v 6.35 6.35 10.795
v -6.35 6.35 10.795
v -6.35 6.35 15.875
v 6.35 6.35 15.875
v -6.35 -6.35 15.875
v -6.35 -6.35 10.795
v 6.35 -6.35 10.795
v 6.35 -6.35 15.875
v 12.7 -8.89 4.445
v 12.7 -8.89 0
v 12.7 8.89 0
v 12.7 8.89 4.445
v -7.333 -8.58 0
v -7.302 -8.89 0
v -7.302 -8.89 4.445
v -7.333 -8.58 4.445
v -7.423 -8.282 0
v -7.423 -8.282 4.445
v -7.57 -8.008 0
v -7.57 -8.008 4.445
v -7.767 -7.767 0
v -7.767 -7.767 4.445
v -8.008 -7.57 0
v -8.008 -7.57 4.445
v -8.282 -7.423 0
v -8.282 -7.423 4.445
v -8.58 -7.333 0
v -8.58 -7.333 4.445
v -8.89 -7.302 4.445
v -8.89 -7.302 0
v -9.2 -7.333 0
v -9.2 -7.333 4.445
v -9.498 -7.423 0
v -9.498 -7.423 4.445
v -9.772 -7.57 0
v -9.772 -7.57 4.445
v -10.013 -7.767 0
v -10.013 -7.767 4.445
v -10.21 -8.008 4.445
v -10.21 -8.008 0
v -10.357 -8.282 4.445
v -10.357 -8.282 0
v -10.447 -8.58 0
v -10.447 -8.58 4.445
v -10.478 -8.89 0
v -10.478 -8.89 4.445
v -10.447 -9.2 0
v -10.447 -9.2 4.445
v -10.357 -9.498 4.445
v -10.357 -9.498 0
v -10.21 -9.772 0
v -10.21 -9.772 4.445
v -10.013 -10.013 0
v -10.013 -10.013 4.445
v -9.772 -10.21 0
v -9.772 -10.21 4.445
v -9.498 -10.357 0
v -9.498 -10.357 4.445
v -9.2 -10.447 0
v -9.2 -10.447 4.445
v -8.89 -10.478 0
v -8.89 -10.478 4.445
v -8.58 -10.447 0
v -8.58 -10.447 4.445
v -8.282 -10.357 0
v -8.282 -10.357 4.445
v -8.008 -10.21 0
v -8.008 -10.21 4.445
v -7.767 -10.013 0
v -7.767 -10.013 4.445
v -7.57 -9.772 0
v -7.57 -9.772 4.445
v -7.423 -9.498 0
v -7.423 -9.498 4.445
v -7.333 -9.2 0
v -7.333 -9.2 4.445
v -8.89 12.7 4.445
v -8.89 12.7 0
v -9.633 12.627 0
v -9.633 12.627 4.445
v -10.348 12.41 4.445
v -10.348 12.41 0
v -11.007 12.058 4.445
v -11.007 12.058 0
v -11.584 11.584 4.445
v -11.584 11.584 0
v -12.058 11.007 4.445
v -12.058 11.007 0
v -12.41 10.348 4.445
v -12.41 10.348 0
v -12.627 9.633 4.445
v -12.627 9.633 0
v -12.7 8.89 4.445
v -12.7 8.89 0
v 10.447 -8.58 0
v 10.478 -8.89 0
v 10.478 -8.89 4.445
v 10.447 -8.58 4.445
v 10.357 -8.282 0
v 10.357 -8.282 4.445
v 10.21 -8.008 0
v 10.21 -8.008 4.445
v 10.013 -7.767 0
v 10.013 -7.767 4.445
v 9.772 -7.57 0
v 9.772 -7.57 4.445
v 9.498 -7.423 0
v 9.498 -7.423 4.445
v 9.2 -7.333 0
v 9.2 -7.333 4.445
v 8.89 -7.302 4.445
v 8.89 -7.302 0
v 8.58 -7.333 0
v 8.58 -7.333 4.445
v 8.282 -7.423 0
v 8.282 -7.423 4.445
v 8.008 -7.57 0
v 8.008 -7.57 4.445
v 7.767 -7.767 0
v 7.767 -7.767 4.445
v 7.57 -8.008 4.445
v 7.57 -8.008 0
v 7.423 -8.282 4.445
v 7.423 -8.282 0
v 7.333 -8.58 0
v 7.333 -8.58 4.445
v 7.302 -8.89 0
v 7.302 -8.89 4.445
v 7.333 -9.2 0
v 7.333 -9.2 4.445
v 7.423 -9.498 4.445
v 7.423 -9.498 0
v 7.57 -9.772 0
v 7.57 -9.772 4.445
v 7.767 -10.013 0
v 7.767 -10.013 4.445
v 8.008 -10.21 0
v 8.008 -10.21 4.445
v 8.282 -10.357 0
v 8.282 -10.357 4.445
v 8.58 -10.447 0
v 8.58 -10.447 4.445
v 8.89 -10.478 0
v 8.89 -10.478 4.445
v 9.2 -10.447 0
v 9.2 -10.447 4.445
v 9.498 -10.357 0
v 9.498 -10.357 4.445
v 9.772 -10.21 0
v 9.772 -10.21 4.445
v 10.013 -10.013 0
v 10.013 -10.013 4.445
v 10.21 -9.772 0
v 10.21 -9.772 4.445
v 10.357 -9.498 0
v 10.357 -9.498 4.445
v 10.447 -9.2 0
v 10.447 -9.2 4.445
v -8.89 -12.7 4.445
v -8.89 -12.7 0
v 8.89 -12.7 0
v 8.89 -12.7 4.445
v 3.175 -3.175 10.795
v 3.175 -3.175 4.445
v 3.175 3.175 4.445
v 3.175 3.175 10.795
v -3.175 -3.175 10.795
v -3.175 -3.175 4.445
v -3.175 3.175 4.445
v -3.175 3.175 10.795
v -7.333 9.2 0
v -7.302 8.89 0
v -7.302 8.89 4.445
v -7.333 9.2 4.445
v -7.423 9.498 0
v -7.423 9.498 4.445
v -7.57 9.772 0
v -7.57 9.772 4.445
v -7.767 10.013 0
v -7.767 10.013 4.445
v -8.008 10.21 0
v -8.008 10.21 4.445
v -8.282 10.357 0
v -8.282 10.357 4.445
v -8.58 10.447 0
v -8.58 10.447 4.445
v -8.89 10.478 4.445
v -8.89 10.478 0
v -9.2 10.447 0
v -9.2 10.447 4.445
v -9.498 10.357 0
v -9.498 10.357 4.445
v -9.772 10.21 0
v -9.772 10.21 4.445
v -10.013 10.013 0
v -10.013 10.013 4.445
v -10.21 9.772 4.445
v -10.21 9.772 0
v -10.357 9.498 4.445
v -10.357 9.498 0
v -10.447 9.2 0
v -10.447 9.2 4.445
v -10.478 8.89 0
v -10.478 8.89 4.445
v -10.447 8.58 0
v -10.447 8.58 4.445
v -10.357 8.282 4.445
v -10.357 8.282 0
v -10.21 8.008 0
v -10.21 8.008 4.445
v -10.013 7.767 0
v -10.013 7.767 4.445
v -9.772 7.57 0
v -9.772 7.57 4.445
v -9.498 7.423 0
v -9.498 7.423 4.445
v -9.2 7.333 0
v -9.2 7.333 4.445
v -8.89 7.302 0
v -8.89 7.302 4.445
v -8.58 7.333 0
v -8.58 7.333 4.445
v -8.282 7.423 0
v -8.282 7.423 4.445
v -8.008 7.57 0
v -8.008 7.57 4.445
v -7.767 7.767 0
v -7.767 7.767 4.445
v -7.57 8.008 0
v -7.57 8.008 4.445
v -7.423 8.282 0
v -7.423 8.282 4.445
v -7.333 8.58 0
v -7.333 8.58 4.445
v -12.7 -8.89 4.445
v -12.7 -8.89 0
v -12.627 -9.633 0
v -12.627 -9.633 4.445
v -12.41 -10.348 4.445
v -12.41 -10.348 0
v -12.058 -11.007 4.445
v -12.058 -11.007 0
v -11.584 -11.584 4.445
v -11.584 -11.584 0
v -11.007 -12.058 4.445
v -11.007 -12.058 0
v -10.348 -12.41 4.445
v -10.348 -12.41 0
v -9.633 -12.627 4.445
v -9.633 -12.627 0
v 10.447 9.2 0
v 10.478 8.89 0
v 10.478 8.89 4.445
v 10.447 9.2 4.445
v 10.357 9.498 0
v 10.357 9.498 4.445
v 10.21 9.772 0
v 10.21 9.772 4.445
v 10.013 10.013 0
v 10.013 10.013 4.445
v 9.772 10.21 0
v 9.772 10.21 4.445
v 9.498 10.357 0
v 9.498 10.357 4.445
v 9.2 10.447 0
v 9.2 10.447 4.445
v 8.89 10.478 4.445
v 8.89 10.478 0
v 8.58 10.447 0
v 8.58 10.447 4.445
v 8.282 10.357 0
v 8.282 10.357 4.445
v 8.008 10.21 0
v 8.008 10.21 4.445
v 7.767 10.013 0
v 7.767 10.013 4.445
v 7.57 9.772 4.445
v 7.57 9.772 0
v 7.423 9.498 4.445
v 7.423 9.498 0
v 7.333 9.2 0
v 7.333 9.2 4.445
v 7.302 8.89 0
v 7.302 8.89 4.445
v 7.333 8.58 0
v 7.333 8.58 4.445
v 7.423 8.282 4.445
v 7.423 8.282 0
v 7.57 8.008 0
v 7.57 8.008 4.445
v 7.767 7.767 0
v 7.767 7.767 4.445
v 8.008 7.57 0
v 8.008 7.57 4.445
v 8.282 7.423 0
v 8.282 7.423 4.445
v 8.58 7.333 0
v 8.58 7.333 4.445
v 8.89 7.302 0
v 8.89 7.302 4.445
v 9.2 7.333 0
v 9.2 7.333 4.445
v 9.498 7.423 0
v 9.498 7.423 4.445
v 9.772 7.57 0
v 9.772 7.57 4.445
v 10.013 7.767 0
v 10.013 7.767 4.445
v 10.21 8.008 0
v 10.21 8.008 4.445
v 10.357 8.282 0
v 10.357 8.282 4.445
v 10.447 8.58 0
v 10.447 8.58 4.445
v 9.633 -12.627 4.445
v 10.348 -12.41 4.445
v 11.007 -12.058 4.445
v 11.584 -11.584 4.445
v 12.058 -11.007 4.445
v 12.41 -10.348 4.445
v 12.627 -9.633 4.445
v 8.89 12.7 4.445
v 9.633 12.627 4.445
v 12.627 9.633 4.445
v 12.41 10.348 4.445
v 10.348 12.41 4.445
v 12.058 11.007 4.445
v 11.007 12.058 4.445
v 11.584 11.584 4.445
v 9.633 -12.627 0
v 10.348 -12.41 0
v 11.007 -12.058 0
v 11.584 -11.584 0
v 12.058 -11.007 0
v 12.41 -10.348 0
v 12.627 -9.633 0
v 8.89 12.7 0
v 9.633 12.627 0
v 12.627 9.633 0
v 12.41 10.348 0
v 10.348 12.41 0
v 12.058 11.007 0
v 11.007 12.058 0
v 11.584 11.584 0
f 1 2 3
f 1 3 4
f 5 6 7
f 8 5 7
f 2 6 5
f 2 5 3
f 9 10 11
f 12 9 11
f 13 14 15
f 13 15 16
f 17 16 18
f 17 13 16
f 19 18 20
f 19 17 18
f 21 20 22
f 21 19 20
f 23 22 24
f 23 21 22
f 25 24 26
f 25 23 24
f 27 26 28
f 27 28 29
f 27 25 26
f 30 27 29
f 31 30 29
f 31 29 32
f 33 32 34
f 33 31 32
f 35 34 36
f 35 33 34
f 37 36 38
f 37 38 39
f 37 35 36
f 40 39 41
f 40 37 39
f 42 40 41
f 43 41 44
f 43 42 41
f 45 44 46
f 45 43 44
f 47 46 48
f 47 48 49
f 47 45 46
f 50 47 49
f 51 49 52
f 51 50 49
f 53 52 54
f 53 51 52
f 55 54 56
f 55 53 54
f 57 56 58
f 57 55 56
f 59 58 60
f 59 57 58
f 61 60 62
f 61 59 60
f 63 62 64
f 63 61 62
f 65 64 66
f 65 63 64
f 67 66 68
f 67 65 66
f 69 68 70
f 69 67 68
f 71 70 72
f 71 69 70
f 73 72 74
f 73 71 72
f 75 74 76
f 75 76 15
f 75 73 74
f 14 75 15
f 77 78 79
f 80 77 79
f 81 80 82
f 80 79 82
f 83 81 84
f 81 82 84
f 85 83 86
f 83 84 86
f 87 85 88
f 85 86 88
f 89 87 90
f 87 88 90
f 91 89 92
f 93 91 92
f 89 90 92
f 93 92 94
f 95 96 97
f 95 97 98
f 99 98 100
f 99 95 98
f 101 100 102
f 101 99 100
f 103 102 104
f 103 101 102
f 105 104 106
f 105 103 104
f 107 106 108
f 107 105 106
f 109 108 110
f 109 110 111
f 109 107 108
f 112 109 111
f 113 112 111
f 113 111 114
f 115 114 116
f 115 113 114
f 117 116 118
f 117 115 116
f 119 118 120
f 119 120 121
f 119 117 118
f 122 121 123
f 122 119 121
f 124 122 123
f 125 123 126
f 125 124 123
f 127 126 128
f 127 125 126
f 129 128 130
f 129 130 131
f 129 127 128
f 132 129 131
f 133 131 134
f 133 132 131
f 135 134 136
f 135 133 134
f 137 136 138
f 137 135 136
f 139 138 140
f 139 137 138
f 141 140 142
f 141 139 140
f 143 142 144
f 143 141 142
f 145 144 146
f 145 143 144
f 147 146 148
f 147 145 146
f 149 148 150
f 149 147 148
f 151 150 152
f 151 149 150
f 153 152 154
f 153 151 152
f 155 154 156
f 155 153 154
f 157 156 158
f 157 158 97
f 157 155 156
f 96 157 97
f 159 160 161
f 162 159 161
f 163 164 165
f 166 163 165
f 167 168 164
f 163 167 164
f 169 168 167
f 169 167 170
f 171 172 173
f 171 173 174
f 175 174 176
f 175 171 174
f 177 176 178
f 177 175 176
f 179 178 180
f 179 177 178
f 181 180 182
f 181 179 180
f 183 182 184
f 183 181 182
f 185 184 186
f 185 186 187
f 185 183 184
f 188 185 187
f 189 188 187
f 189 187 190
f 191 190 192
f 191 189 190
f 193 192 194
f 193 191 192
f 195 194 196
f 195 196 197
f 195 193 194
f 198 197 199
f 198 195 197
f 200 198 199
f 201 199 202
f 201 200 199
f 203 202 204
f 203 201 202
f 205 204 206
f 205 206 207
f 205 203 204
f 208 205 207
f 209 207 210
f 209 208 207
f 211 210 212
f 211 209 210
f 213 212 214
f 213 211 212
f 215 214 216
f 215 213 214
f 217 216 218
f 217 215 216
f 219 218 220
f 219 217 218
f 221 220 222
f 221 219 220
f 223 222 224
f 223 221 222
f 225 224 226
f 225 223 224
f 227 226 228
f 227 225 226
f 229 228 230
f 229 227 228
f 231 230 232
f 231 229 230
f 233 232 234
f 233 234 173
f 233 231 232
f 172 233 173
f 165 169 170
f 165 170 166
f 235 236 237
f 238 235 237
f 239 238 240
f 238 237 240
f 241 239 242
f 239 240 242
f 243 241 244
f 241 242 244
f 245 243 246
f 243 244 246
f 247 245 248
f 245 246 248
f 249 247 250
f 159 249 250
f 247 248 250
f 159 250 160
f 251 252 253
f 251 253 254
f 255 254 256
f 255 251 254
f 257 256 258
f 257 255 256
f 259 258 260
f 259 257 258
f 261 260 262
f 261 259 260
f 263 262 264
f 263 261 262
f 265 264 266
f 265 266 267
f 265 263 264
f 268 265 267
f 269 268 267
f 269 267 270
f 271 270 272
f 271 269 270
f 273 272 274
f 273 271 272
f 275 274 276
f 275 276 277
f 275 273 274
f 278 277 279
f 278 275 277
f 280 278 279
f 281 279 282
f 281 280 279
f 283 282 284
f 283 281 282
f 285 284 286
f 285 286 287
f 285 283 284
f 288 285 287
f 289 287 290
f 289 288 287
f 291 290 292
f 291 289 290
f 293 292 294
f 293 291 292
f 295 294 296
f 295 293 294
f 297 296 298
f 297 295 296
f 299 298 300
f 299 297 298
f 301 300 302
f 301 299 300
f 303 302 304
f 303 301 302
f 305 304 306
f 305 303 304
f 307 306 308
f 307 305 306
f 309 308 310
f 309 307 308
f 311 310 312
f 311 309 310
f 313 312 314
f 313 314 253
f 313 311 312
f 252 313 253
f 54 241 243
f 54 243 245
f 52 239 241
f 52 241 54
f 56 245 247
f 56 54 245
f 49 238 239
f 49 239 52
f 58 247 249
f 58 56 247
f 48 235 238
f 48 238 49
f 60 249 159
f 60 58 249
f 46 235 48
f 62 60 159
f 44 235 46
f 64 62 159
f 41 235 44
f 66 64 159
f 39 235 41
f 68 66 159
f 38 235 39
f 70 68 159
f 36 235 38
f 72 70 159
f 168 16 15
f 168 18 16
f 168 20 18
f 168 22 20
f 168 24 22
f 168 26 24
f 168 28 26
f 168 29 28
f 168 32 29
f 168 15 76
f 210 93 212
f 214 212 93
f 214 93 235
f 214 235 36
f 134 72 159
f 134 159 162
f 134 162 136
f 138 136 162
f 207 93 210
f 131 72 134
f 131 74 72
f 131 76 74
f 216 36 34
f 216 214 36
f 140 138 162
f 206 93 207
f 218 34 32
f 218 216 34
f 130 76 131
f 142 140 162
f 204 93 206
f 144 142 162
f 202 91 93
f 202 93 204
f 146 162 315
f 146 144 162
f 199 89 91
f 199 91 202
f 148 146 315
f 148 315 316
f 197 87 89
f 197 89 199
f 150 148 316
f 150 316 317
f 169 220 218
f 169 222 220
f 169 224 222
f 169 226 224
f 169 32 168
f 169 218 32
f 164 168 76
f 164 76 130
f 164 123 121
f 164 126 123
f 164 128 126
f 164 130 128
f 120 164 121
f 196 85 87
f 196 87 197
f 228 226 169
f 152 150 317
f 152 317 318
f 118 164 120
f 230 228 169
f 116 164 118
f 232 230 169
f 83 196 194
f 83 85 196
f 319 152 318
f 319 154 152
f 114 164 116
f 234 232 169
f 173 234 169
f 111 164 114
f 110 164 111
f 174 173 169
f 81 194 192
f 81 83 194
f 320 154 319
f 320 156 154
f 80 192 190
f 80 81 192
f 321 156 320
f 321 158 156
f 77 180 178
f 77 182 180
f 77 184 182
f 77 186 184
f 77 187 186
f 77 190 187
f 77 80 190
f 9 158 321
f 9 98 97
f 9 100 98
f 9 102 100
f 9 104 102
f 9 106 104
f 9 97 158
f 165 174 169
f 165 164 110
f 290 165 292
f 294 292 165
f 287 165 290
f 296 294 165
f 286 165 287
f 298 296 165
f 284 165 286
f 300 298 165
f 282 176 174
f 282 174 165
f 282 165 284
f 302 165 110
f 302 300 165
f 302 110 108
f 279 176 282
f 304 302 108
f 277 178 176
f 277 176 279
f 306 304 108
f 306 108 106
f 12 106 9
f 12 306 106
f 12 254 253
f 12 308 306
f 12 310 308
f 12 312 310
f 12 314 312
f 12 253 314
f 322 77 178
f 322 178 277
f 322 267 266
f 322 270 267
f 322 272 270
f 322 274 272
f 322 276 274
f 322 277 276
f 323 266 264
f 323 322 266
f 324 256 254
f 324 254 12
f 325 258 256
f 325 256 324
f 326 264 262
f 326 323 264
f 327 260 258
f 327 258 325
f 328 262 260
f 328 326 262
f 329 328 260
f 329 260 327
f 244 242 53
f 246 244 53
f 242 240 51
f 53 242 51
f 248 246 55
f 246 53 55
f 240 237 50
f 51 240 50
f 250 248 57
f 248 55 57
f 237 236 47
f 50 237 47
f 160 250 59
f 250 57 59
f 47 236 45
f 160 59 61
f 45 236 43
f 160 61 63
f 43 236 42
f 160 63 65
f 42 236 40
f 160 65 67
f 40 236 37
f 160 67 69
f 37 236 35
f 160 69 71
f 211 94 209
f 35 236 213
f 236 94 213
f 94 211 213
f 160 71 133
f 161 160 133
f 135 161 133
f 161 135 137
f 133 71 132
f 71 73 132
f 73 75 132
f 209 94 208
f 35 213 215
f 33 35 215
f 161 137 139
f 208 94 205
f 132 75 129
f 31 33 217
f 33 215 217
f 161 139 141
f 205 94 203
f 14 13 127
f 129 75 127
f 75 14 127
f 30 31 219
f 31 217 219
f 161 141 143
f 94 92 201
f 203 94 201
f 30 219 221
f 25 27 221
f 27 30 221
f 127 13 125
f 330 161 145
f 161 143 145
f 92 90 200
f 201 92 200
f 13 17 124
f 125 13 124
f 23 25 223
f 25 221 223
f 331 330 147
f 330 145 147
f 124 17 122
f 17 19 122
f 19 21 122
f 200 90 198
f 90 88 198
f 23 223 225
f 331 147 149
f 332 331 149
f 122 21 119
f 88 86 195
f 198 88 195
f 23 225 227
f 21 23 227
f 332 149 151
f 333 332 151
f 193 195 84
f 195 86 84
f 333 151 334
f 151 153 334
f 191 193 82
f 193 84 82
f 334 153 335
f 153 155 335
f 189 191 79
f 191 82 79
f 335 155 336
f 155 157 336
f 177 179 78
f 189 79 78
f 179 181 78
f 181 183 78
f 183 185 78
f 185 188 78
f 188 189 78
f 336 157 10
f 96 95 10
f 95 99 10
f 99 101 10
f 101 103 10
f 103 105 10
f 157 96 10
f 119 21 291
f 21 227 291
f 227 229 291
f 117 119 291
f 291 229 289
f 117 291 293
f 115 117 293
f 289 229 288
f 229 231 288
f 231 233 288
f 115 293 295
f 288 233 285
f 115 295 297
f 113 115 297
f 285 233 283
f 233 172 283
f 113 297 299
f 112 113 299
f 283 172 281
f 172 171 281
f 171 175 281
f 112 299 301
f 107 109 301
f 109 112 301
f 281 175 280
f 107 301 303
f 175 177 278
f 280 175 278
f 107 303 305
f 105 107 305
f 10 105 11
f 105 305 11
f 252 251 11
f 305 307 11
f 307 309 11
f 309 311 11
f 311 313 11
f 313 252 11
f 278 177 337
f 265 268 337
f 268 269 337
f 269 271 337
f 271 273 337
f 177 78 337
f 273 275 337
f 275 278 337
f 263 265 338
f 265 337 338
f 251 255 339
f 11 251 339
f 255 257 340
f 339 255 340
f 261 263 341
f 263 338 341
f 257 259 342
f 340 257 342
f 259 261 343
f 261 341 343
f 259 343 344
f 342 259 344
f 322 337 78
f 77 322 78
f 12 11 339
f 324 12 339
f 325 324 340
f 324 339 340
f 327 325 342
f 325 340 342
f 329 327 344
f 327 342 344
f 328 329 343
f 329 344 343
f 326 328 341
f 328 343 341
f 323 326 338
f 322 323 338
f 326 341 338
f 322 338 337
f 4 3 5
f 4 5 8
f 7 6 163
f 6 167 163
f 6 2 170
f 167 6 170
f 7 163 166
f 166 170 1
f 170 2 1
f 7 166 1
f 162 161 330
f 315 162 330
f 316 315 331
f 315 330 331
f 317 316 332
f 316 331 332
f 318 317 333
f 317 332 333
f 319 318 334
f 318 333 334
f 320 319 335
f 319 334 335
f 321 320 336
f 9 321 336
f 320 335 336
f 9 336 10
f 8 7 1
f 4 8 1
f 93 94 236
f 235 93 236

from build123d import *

# Parameters (mm, degrees)
F0_R     = 1.5875
F1_DEPTH = 4.445
F2_W     = 6.35
F2_H     = 6.35
F3_DEPTH = 6.35
F4_W     = 12.7
F4_H     = 12.7
F5_DEPTH = 5.08


with BuildPart() as f1:
    # F0 (on Top) → F1 (new body)
    with BuildSketch(Plane.XY):
        with BuildLine():
            ThreePointArc((12.7, 8.89), (11.584077, 11.584077), (8.89, 12.7))
            Line((8.89, 12.7), (-8.89, 12.7))
            ThreePointArc((-8.89, 12.7), (-11.584077, 11.584077), (-12.7, 8.89))
            Line((-12.7, 8.89), (-12.7, -8.89))
            ThreePointArc((-12.7, -8.89), (-11.584077, -11.584077), (-8.89, -12.7))
            Line((-8.89, -12.7), (8.89, -12.7))
            ThreePointArc((8.89, -12.7), (11.584077, -11.584077), (12.7, -8.89))
            Line((12.7, -8.89), (12.7, 8.89))
        make_face()
        with Locations((-8.89, -8.89)):
            Circle(F0_R, mode=Mode.SUBTRACT)
        with Locations((8.89, -8.89)):
            Circle(F0_R, mode=Mode.SUBTRACT)
        with Locations((-8.89, 8.89)):
            Circle(F0_R, mode=Mode.SUBTRACT)
        with Locations((8.89, 8.89)):
            Circle(F0_R, mode=Mode.SUBTRACT)
    extrude(amount=F1_DEPTH)

    # F2 (on face) → F3 (join)
    with BuildSketch(Plane.XY.offset(4.445)):
        Rectangle(F2_W, F2_H)
    extrude(amount=F3_DEPTH)

    # F4 (on face) → F5 (join)
    with BuildSketch(Plane.XY.offset(10.795)):
        Rectangle(F4_W, F4_H)
    extrude(amount=F5_DEPTH)


solid = f1.part
